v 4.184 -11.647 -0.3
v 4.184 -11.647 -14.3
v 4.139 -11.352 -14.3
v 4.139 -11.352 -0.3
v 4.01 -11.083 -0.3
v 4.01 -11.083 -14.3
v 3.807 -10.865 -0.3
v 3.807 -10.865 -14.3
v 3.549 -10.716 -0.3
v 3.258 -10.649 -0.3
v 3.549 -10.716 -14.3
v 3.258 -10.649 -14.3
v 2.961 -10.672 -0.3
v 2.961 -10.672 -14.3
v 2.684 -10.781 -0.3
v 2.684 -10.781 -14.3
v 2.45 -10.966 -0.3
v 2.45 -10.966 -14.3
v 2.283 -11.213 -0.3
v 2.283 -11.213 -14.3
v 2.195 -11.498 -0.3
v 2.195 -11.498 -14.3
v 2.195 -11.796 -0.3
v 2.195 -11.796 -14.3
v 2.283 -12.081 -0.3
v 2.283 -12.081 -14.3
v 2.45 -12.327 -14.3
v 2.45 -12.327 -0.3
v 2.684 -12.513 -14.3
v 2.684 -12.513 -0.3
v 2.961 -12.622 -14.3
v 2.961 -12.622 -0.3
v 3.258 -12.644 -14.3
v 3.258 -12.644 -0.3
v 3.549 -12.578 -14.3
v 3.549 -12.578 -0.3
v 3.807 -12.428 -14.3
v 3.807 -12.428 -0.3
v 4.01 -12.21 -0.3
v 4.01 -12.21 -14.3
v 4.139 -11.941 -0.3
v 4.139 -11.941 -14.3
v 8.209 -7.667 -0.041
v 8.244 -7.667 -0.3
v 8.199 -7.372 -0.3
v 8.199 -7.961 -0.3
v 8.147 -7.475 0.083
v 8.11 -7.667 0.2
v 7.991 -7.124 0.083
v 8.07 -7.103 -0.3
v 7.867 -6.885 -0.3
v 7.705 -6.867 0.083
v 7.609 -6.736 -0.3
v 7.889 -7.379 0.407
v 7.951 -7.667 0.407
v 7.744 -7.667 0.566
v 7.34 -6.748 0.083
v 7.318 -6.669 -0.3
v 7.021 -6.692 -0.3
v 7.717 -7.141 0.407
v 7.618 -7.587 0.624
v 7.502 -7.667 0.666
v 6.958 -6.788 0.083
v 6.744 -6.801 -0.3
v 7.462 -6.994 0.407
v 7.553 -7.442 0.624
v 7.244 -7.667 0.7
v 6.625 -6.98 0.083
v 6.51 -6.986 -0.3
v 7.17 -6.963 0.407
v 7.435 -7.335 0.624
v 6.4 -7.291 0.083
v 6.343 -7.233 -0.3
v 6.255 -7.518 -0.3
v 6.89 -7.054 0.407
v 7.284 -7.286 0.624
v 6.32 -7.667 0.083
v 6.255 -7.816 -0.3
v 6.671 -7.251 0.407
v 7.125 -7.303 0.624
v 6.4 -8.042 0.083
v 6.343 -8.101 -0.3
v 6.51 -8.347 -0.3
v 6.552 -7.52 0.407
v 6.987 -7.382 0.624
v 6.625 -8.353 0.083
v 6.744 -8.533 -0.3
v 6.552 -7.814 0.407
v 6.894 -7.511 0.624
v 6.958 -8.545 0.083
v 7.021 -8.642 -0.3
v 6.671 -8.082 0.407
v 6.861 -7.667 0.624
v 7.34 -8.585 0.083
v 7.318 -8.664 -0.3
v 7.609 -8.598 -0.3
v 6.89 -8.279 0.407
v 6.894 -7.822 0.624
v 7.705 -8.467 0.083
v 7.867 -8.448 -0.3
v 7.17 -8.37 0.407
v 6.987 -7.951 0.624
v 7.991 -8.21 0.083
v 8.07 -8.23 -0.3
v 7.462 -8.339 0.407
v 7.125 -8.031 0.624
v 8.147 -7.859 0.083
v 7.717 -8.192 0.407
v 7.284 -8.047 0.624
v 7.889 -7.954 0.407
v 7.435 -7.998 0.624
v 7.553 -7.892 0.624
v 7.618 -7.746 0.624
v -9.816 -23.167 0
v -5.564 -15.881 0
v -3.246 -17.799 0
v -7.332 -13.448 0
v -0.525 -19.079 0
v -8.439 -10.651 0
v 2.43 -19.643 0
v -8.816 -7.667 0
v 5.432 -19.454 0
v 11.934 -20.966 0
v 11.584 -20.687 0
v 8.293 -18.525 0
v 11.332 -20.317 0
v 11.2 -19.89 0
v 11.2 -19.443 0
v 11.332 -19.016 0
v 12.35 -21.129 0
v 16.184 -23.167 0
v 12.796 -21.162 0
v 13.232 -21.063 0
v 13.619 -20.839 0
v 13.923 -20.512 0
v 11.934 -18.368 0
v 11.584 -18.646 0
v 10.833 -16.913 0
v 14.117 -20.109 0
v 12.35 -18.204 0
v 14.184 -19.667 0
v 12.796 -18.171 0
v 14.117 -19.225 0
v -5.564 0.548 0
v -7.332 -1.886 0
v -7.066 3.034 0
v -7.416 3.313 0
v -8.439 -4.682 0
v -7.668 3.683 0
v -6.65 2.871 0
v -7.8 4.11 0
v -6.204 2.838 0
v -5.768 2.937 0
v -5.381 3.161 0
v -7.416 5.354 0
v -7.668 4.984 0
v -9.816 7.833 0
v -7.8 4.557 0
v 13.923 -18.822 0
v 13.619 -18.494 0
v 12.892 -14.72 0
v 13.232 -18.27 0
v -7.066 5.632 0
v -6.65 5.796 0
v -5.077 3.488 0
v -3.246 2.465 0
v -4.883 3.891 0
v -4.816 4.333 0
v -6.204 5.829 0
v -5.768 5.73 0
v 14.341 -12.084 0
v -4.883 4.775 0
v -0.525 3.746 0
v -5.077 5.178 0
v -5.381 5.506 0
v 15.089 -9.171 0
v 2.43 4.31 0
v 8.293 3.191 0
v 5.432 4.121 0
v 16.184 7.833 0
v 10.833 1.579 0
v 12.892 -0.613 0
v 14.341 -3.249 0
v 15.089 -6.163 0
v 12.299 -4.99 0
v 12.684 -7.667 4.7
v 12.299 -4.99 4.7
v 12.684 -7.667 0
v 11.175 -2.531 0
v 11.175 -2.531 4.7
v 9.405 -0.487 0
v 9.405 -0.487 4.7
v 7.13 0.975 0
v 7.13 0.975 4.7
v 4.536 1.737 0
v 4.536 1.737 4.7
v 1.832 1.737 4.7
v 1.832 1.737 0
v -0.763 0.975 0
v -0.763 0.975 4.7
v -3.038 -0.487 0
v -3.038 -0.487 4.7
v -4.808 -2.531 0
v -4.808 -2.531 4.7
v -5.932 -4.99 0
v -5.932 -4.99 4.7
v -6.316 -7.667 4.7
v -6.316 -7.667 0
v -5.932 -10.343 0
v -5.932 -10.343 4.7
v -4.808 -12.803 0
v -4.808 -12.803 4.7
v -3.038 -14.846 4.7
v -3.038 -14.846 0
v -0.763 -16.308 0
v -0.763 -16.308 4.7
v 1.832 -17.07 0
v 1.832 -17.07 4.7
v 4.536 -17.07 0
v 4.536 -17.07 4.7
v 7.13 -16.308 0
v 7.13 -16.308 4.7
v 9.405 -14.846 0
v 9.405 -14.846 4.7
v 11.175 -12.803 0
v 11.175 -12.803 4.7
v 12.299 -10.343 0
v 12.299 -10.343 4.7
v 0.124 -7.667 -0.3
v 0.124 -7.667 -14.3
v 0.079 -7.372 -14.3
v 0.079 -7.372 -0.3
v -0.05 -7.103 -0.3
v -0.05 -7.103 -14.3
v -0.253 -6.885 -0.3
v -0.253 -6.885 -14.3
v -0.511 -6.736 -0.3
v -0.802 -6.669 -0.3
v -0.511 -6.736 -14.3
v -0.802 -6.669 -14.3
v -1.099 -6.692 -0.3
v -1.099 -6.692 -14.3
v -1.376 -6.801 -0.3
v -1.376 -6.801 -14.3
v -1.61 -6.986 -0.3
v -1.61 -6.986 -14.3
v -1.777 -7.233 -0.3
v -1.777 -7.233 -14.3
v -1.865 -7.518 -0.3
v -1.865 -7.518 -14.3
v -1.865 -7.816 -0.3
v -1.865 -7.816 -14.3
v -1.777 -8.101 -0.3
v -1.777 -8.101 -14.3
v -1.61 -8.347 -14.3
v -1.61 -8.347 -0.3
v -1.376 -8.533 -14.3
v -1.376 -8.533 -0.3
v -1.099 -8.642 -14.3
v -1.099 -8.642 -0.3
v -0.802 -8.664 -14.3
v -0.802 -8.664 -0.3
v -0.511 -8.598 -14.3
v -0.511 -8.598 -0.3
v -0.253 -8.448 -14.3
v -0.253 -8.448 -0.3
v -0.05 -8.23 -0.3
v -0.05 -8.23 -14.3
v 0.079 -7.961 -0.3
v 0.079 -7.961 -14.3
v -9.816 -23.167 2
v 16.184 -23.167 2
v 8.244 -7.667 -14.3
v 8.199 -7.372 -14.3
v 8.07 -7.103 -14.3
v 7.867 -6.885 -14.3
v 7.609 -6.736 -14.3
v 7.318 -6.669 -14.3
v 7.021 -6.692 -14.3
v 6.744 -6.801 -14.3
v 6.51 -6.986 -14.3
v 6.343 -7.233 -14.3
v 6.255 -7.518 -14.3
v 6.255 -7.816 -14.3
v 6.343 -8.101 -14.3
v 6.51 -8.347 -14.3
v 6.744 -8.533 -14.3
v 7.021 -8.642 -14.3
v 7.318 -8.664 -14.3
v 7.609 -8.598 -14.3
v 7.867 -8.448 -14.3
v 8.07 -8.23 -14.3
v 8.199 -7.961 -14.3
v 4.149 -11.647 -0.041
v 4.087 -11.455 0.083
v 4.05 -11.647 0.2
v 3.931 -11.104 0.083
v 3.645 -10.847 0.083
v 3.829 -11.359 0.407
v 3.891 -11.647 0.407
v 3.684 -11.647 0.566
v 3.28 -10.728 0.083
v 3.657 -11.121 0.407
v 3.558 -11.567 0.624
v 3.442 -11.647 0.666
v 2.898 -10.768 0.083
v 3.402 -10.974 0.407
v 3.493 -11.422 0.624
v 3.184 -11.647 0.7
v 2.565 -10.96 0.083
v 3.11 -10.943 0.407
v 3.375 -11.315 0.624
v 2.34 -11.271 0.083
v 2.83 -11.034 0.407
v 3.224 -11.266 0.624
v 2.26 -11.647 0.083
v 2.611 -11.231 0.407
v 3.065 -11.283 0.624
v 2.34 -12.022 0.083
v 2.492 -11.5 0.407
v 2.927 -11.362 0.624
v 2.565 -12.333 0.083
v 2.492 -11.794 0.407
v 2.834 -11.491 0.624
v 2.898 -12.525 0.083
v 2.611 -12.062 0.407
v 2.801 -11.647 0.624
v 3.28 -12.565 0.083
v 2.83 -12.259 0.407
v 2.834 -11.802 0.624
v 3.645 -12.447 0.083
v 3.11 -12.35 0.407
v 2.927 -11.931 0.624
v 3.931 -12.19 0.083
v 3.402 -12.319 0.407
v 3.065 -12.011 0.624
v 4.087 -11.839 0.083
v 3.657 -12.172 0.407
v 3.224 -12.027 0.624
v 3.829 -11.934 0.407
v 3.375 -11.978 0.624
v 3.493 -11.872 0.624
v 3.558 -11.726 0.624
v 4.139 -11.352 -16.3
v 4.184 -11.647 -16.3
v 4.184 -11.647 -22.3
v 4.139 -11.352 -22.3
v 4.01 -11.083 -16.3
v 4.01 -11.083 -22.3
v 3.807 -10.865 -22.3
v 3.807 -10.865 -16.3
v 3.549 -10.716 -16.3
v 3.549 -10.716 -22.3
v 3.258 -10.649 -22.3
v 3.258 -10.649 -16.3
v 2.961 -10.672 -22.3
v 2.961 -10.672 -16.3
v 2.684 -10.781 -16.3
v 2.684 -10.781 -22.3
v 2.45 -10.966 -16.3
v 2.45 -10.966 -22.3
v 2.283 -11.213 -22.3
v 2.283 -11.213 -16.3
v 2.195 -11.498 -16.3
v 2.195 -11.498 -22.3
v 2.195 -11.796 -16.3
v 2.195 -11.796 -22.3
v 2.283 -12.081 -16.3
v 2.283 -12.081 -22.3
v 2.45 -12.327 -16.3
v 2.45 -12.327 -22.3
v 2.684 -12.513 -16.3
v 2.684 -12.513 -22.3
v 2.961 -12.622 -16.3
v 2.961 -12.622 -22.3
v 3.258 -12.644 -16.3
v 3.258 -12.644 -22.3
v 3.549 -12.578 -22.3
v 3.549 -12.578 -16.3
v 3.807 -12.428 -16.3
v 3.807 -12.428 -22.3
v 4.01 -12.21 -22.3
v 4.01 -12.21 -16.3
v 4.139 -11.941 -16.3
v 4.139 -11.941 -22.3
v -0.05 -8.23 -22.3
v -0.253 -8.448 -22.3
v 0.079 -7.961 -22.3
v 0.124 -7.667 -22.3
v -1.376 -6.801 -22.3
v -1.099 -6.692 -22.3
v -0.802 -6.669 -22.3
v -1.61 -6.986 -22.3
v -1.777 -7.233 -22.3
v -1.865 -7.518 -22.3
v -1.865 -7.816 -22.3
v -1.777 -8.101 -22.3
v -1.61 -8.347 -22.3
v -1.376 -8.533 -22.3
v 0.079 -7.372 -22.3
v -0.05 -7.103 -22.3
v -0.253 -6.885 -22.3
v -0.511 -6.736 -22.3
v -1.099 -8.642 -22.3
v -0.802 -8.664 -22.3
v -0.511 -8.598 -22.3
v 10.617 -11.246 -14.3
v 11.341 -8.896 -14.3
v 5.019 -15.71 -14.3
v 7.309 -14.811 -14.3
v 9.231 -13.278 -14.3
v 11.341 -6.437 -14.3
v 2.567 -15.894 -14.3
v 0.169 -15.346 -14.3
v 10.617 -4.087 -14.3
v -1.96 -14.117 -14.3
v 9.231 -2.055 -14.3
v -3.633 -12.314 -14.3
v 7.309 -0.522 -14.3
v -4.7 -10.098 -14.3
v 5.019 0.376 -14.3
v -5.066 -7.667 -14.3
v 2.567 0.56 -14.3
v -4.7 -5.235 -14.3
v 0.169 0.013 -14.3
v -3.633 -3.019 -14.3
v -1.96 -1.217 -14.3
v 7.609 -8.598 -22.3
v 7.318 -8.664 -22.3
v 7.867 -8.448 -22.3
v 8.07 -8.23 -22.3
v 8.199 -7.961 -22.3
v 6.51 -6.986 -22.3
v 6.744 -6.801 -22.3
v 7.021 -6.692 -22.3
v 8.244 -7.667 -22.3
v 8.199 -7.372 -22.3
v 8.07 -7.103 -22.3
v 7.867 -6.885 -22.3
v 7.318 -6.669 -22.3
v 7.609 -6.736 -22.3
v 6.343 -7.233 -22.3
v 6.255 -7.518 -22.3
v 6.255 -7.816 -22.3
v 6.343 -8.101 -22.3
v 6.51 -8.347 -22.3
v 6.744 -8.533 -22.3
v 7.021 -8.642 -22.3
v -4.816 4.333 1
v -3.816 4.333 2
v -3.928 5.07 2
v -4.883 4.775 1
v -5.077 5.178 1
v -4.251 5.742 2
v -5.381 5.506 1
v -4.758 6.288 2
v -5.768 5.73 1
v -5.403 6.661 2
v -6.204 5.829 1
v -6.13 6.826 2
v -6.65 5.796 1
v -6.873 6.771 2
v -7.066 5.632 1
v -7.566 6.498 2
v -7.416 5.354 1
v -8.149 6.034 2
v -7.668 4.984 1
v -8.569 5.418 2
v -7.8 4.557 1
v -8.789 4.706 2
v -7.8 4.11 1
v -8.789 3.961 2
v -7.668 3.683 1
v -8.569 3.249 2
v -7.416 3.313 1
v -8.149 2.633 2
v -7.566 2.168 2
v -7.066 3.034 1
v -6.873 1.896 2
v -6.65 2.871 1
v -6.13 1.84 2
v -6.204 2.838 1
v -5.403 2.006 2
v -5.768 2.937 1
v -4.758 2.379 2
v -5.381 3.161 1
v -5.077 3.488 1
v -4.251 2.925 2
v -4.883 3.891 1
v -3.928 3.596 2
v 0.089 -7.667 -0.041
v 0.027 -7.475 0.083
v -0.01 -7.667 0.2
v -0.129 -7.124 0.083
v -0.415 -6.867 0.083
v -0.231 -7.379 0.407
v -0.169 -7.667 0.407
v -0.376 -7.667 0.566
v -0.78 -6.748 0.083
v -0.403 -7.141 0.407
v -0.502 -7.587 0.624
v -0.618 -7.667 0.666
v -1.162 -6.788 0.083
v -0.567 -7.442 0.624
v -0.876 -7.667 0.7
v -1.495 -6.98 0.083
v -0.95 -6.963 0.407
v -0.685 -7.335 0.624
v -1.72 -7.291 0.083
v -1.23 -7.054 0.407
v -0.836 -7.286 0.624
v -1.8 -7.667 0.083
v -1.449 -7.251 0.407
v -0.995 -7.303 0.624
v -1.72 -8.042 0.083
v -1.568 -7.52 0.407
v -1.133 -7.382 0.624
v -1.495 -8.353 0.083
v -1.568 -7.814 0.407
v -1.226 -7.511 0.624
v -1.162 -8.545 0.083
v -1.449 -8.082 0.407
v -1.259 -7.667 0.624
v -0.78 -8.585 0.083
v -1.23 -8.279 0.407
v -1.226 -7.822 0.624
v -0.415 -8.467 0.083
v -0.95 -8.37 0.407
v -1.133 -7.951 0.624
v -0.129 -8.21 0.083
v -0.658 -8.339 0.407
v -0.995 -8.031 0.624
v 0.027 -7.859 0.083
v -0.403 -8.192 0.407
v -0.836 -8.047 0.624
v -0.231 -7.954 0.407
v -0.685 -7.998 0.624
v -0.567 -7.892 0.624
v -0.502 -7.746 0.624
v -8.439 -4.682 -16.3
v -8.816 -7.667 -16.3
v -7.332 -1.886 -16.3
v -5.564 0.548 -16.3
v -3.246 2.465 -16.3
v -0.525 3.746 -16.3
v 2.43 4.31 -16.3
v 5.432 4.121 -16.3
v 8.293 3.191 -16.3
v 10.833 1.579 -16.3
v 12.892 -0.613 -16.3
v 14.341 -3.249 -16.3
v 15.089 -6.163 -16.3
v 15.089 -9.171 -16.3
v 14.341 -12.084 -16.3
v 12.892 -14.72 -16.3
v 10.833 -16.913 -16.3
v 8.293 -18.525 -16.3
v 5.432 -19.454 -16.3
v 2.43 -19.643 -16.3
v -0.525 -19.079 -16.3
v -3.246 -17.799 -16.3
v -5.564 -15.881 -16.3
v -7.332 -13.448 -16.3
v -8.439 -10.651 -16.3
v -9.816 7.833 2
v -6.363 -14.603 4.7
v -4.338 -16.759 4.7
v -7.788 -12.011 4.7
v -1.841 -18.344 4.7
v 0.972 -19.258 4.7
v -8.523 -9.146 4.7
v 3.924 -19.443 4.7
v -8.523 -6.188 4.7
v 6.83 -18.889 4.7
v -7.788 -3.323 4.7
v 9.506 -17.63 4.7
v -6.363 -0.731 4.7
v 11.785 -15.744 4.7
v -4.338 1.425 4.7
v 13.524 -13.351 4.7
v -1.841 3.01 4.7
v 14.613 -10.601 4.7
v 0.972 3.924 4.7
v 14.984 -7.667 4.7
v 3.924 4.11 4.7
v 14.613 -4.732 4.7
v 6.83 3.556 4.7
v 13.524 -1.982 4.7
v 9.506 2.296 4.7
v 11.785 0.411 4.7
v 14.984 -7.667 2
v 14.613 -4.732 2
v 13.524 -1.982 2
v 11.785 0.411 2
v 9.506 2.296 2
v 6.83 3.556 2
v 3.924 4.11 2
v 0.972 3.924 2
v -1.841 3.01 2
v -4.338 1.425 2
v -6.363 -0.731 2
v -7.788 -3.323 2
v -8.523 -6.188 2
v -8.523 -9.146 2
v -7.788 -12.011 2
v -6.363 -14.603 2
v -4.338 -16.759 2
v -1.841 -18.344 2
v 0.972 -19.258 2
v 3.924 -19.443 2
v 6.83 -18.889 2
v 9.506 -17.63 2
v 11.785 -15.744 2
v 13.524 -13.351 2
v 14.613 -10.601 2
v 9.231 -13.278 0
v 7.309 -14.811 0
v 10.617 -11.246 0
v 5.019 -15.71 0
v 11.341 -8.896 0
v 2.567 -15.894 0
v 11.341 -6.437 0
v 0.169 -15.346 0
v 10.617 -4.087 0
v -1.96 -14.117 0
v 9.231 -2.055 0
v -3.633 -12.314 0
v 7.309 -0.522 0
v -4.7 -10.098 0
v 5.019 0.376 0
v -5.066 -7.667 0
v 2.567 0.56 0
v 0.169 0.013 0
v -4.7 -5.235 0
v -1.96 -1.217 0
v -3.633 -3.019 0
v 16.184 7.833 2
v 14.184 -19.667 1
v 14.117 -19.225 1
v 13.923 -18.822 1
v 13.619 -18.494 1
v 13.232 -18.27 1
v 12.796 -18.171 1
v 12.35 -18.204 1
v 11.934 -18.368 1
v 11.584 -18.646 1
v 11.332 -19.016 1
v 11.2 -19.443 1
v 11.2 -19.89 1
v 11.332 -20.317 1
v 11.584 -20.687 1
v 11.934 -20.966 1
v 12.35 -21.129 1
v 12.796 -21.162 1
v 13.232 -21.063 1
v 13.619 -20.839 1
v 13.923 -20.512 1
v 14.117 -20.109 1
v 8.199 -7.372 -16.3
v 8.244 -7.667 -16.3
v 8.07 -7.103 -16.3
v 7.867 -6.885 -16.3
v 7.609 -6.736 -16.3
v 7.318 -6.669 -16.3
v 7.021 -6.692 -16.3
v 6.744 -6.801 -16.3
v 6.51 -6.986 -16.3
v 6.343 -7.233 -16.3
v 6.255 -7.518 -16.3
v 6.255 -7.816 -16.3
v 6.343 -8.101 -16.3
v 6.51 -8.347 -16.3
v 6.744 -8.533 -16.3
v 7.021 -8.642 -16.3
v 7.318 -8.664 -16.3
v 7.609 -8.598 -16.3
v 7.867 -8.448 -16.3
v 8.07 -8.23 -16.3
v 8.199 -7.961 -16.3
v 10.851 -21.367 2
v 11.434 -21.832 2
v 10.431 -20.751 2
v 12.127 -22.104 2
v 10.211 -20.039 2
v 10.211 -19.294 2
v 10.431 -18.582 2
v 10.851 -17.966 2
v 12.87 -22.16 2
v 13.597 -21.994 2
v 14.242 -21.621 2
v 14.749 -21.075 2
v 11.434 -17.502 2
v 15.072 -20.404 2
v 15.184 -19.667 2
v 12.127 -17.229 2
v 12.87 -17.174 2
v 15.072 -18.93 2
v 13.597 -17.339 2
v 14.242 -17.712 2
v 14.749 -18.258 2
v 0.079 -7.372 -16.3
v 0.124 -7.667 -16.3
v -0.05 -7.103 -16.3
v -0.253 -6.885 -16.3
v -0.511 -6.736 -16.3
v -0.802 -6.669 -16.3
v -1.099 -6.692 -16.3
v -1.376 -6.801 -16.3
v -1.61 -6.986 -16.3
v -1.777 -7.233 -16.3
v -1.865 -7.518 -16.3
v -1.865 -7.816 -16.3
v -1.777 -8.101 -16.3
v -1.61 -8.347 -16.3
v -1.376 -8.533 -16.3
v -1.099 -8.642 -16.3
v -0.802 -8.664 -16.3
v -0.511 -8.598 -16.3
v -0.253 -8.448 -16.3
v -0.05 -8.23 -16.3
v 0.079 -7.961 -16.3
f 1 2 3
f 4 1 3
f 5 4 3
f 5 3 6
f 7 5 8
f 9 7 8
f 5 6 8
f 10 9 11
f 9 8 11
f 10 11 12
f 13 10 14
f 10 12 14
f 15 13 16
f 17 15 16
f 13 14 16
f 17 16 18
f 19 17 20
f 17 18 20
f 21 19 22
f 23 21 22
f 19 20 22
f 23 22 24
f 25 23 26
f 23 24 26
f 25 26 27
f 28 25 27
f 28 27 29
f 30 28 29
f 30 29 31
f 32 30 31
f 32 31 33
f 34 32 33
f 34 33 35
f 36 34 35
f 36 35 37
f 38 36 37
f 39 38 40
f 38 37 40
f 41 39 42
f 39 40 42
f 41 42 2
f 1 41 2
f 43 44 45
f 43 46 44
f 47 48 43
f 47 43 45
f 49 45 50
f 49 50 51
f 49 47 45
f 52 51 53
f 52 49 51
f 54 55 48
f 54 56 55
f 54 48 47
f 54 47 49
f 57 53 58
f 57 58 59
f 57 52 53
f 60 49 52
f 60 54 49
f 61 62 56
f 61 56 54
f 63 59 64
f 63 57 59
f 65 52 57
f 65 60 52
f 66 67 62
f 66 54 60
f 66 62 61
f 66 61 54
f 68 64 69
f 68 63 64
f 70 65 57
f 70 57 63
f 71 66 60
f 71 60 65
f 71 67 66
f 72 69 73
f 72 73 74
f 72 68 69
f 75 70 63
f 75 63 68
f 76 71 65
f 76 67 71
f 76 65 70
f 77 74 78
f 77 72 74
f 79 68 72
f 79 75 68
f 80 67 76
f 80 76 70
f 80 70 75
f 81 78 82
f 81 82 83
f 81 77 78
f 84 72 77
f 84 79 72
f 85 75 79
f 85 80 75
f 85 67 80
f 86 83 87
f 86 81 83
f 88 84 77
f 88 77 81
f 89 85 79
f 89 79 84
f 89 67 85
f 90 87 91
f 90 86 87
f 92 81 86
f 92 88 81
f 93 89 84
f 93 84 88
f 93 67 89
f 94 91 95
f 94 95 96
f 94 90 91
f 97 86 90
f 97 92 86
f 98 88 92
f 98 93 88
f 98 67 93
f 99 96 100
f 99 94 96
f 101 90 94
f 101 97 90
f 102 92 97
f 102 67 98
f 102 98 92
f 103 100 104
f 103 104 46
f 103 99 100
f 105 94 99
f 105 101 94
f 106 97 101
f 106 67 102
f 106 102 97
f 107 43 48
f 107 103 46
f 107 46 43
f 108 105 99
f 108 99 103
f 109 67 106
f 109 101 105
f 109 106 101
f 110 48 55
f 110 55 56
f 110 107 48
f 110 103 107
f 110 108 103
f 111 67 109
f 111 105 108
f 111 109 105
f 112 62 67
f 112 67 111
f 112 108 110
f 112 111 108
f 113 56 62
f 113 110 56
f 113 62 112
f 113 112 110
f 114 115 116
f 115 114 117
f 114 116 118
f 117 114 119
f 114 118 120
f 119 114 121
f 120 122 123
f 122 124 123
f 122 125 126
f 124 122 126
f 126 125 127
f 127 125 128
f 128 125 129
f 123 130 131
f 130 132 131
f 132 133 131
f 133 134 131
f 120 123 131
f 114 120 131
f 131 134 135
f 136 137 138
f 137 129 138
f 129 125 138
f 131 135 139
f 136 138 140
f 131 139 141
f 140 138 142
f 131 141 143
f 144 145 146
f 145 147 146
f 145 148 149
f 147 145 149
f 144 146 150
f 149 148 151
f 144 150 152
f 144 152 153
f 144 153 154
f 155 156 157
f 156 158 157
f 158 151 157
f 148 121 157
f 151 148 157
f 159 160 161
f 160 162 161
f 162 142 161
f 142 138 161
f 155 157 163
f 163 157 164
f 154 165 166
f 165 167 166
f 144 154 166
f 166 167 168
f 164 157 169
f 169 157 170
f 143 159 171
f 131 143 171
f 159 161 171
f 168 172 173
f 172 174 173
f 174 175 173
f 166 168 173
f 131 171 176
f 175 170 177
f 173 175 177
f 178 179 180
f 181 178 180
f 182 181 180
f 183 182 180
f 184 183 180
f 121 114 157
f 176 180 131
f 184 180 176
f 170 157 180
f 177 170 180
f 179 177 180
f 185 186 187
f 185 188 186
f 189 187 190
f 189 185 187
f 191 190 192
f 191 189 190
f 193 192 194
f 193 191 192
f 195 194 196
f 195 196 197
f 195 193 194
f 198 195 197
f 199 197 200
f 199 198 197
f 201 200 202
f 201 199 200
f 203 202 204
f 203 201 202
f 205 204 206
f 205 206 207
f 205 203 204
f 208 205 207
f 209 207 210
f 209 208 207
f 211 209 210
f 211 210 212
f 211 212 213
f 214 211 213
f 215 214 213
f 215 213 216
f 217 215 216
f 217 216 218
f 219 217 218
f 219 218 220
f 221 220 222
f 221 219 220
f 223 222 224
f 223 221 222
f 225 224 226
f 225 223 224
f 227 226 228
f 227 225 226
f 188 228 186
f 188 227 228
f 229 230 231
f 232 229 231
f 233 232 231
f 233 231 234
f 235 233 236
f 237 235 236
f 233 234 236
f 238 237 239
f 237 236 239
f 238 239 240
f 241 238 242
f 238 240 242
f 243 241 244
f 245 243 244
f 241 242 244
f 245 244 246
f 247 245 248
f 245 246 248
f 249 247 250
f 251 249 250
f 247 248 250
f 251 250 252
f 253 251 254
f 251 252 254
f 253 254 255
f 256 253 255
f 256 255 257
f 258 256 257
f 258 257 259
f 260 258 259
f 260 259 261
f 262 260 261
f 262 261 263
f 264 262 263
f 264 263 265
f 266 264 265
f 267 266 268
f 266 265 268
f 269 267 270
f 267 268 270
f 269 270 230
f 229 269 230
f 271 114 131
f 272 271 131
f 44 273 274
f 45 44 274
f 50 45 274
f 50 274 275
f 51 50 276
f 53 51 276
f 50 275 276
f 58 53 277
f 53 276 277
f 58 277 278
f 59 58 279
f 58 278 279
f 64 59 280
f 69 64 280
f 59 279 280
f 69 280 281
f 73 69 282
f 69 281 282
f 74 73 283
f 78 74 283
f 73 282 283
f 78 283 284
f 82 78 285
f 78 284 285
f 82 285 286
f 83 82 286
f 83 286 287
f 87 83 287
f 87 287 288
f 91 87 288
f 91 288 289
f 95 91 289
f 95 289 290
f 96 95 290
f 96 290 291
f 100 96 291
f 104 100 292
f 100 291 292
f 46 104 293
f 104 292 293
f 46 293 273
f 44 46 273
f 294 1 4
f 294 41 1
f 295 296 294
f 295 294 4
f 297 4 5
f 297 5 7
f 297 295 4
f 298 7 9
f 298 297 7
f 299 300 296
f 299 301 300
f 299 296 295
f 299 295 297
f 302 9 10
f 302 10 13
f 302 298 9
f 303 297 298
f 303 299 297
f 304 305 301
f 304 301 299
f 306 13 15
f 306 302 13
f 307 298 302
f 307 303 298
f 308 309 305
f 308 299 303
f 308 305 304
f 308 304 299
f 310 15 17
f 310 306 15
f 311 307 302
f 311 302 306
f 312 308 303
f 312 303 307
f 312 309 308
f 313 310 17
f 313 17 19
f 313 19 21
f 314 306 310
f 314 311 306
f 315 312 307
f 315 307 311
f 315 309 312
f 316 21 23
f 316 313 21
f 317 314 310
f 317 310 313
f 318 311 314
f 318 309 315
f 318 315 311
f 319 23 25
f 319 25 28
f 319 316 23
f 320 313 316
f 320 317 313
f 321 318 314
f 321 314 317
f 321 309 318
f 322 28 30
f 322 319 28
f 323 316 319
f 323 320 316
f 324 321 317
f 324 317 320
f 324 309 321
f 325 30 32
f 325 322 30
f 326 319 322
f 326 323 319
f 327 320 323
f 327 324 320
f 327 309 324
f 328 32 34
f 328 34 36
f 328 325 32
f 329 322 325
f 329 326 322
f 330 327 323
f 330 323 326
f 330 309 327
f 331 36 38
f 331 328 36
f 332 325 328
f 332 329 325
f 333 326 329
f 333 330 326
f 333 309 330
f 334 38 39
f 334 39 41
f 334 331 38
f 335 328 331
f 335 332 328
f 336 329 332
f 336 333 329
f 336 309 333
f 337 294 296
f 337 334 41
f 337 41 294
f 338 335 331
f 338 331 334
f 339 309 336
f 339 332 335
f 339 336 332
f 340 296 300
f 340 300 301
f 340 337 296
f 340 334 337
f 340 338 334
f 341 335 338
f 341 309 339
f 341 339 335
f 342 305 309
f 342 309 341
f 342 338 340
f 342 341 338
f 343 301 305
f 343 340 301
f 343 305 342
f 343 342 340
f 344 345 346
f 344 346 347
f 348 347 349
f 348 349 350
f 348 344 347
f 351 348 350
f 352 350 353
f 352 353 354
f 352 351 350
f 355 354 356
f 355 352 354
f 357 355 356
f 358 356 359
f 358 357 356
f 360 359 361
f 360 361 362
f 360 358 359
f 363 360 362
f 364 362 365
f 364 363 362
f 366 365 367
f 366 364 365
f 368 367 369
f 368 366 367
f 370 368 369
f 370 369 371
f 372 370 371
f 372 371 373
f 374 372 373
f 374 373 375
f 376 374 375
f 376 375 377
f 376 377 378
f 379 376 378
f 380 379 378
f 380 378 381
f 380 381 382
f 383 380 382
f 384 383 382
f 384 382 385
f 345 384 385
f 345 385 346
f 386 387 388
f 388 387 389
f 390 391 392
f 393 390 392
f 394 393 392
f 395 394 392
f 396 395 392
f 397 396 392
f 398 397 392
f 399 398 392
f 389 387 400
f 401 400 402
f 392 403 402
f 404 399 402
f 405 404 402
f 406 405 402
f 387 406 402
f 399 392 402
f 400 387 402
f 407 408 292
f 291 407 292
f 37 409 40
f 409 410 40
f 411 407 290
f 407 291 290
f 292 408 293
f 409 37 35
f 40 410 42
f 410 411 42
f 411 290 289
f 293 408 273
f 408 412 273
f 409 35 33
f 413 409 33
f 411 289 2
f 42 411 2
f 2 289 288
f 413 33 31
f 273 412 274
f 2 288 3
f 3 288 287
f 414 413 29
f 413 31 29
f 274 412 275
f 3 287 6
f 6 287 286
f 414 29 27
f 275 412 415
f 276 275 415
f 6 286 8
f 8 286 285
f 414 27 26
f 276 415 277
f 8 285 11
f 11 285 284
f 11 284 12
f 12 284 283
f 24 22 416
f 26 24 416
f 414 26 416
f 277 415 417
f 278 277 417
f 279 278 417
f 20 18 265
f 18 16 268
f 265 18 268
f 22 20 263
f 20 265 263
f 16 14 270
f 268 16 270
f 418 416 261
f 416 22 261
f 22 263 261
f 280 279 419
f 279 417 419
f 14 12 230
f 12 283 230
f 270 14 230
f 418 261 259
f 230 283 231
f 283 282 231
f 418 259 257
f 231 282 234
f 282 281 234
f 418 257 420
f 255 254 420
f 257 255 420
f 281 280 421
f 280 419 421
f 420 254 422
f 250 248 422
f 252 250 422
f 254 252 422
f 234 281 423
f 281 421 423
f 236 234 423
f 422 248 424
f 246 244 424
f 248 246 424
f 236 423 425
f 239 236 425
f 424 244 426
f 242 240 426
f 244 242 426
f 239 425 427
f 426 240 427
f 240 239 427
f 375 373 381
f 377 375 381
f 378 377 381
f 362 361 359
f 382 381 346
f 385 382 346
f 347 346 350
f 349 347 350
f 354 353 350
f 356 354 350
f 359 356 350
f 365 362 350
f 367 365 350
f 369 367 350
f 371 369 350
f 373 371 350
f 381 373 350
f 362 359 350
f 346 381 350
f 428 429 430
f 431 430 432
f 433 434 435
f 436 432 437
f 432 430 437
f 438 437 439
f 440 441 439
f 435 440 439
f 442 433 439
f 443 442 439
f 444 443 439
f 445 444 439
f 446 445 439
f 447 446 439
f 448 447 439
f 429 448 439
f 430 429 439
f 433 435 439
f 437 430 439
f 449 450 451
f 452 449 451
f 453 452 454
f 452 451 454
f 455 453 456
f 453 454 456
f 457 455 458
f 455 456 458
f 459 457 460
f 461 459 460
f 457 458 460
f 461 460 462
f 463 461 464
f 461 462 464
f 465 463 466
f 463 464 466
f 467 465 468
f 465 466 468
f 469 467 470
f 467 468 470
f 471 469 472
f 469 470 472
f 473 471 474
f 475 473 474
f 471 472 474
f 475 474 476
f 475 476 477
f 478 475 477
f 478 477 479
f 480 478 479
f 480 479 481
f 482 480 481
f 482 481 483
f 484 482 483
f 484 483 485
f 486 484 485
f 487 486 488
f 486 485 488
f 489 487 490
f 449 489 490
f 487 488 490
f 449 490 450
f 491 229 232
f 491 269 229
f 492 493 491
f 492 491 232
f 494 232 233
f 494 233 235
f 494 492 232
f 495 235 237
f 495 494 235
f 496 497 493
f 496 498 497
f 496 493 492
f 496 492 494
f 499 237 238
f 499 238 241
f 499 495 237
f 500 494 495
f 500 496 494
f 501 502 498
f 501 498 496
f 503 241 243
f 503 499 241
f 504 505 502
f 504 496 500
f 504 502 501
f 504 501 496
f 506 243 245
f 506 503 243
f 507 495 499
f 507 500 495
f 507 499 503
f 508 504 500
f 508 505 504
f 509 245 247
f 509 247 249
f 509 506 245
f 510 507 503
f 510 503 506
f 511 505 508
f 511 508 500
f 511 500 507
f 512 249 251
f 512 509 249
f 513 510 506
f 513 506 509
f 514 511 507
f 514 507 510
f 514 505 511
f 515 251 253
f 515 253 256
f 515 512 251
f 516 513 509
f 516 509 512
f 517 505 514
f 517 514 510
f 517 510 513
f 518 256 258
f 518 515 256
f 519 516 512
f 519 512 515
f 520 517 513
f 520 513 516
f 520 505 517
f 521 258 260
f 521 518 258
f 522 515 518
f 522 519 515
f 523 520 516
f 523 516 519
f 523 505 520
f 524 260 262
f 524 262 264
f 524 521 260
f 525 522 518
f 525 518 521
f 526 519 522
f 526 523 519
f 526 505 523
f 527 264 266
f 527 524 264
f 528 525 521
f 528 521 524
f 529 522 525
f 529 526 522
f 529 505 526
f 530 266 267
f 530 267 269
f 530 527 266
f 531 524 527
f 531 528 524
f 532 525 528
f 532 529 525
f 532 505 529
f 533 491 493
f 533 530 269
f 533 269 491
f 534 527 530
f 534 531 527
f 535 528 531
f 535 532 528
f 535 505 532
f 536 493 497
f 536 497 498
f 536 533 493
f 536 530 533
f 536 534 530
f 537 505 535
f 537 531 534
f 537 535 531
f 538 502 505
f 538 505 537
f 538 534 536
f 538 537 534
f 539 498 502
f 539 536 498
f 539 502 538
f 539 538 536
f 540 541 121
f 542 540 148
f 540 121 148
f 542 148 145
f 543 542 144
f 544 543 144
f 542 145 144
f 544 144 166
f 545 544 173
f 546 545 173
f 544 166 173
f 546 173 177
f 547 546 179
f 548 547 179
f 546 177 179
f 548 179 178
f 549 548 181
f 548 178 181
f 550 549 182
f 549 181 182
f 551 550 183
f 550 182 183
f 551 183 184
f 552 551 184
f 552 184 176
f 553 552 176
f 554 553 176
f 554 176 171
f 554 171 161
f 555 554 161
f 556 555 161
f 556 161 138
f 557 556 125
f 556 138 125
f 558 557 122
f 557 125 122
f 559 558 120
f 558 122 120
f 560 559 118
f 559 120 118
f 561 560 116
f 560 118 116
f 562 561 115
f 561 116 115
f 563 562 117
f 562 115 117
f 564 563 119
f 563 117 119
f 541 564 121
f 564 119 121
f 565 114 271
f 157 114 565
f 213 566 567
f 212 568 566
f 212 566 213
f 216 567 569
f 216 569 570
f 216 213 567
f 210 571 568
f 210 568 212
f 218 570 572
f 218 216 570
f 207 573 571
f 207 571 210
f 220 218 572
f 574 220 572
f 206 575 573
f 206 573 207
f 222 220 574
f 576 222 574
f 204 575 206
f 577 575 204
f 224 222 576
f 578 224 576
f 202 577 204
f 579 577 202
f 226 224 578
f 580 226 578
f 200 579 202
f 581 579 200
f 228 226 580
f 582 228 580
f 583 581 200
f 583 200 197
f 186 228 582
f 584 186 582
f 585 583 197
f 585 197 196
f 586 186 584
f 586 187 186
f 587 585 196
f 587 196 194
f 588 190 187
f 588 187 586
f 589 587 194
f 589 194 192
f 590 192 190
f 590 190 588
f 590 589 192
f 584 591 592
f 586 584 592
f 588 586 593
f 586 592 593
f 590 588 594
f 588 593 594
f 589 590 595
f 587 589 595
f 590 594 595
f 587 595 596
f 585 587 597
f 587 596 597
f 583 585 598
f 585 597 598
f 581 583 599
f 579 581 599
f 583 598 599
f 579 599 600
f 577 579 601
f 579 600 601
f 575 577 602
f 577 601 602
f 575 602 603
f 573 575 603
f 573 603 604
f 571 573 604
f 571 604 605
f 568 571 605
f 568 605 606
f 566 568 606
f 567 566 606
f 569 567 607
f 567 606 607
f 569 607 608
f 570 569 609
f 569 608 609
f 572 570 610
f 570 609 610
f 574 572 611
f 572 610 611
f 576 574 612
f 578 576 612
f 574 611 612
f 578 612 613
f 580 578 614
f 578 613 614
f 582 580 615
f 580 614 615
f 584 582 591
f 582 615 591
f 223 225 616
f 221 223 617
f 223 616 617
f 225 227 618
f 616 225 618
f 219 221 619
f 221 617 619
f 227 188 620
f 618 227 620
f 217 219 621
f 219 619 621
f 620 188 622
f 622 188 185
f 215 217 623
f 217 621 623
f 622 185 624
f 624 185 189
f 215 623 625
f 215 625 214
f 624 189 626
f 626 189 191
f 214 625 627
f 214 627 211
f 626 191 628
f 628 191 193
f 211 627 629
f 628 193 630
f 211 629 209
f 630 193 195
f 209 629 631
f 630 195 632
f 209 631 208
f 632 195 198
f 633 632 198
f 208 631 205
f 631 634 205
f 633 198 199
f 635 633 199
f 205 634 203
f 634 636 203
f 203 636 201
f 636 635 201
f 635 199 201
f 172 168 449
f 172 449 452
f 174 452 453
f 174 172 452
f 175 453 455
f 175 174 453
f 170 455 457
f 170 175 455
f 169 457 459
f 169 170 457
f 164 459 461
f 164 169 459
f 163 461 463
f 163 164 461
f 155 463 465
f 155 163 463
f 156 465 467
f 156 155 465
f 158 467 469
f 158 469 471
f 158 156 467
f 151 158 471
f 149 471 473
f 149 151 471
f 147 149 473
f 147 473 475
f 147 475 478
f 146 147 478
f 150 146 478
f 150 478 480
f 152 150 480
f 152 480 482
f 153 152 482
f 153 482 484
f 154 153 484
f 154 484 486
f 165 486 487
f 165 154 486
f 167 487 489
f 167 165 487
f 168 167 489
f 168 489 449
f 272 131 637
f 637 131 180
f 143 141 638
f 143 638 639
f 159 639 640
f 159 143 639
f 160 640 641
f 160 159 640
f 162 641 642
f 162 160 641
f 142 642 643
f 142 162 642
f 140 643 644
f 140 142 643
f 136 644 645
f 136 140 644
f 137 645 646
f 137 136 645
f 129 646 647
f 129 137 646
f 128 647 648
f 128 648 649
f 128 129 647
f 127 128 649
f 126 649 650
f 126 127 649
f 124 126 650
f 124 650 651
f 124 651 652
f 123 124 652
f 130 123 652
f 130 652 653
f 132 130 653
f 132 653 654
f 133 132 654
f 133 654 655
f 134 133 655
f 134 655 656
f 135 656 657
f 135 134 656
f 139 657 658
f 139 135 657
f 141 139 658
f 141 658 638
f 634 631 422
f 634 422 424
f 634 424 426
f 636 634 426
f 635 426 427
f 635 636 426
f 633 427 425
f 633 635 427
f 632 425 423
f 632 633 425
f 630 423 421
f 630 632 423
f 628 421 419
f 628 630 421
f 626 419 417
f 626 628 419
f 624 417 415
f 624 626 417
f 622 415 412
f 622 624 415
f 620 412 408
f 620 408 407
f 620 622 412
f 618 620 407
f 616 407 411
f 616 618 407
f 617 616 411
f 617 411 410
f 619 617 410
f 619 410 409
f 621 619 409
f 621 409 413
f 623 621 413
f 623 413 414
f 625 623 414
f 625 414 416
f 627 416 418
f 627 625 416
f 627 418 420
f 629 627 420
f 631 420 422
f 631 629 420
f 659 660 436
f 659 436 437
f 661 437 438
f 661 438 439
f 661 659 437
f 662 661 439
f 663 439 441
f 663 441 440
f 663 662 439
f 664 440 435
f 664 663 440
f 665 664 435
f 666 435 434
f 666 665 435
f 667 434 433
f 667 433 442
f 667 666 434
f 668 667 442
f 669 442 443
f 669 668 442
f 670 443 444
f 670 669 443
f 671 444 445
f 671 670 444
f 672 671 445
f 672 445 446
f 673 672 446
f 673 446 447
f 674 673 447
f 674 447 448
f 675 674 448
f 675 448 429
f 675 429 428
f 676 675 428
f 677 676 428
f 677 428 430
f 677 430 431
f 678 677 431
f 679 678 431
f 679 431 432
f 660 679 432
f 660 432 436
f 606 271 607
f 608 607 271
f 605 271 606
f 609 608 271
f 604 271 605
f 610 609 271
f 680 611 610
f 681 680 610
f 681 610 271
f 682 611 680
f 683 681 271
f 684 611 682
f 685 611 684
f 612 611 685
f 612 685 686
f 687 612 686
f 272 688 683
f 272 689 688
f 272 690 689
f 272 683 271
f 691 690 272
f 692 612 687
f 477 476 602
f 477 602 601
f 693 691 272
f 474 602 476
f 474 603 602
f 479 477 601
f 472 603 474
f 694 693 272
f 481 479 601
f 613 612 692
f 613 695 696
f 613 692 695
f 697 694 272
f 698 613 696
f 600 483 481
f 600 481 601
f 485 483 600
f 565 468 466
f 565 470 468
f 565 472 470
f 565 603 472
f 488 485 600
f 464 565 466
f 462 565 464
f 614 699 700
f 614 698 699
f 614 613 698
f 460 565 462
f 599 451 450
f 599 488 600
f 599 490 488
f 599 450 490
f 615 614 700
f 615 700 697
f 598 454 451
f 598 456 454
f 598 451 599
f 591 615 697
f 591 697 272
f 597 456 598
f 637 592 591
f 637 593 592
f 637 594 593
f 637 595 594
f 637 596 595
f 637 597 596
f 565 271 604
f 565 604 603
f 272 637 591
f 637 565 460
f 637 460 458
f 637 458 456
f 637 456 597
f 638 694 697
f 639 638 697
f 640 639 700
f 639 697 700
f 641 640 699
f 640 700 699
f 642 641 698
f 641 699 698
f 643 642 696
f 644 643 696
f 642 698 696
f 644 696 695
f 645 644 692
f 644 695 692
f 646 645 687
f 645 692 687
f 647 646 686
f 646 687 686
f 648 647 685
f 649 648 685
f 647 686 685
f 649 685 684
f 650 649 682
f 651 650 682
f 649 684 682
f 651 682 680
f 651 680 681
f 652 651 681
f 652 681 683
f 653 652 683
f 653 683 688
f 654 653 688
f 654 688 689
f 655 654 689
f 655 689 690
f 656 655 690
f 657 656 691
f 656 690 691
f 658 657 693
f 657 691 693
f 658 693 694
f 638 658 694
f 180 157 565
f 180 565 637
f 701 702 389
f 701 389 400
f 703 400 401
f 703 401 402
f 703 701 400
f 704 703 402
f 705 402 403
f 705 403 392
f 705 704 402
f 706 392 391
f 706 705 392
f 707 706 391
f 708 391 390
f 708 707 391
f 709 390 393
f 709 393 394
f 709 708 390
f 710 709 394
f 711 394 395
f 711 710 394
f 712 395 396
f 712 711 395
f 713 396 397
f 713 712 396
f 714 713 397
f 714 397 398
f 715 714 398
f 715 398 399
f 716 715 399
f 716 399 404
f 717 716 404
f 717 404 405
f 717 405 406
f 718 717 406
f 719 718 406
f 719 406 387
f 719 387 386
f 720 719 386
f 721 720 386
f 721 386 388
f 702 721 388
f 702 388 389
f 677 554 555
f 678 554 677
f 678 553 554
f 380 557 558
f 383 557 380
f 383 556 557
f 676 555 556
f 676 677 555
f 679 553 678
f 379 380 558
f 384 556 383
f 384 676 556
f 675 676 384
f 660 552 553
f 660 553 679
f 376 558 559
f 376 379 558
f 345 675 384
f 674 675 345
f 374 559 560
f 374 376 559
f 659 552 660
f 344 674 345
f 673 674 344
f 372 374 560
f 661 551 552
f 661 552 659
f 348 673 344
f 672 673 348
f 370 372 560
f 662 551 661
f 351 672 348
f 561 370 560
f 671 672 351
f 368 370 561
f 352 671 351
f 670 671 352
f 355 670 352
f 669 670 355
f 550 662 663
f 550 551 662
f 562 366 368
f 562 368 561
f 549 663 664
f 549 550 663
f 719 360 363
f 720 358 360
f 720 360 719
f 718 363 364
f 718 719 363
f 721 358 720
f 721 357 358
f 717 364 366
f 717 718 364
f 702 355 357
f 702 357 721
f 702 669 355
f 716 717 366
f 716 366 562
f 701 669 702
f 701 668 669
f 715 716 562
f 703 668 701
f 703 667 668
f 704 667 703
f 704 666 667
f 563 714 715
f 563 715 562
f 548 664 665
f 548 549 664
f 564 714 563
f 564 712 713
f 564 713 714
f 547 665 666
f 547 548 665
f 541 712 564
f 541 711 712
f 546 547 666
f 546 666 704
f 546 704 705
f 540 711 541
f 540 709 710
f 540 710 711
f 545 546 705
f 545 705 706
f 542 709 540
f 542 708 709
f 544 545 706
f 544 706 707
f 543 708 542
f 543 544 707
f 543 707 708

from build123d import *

# Parameters (mm, degrees)
ESQUISSE1_W             = 26
ESQUISSE1_H             = 31
ESQUISSE1_R             = 9.5
ESQUISSE1_R_2           = 1.5
BOSS_EXTRU_1_DEPTH      = 2
ESQUISSE2_R             = 11.8
ESQUISSE2_R_2           = 9.5
BOSS_EXTRU_2_DEPTH      = 2.7
CHANFREIN1_SIZE         = 1
ESQUISSE3_R             = 12
ESQUISSE3_R_2           = 8.25
BOSS_EXTRU_3_DEPTH      = 14.3
ESQUISSE4_R             = 12
BOSS_EXTRU_4_DEPTH      = 2
ESQUISSE5_R             = 1
BOSS_EXTRU_5_DEPTH      = 15
BOSS_EXTRU_5_DEPTH_BACK = 8
CONG_1_R                = 1


with BuildPart() as part:
    # Esquisse1 → Boss.-Extru.1 (new body)
    with BuildSketch(Plane.XY):
        with Locations((3.183515483, -7.666666667)):
            Rectangle(ESQUISSE1_W, ESQUISSE1_H)
        with Locations((3.183515483, -7.666666667)):
            Circle(ESQUISSE1_R, mode=Mode.SUBTRACT)
        with Locations((-6.316484517, 4.333333333)):
            Circle(ESQUISSE1_R_2, mode=Mode.SUBTRACT)
        with Locations((12.683515483, -19.666666667)):
            Circle(ESQUISSE1_R_2, mode=Mode.SUBTRACT)
    extrude(amount=BOSS_EXTRU_1_DEPTH)

    # Esquisse2 → Boss.-Extru.2 (add)
    with BuildSketch(Plane.XY.offset(2)):
        with Locations((3.183515483, -7.666666667)):
            Circle(ESQUISSE2_R)
        with Locations((3.183515483, -7.666666667)):
            Circle(ESQUISSE2_R_2, mode=Mode.SUBTRACT)
    extrude(amount=BOSS_EXTRU_2_DEPTH)

    # Chanfrein1
    chanfrein1_edges = [part.edges().sort_by_distance(p)[0] for p in [
        (-7.816484517, 4.333333333, 2),
        (11.183515483, -19.666666667, 2),
    ]]
    chamfer(chanfrein1_edges, length=CHANFREIN1_SIZE)

    # Esquisse3 → Boss.-Extru.3 (add)
    with BuildSketch(Plane(origin=(0, 0, 0), x_dir=(-1, 0, 0), z_dir=(0, 0, -1))):
        with Locations((-3.183515483, -7.666666667)):
            Circle(ESQUISSE3_R)
        with Locations((-3.183515483, -7.666666667)):
            Circle(ESQUISSE3_R_2, mode=Mode.SUBTRACT)
    extrude(amount=BOSS_EXTRU_3_DEPTH)

    # Esquisse4 → Boss.-Extru.4 (add)
    with BuildSketch(Plane(origin=(0, 0, -14.3), x_dir=(-1, 0, 0), z_dir=(0, 0, -1))):
        with Locations((-3.183515483, -7.666666667)):
            Circle(ESQUISSE4_R)
    extrude(amount=BOSS_EXTRU_4_DEPTH)

    # Esquisse5 → Boss.-Extru.5 (add, two sides)
    with BuildSketch(Plane.XY.offset(-14.3)) as boss_extru_5_sk:
        with Locations((7.243515483, -7.666666667)):
            Circle(ESQUISSE5_R)
        with Locations((-0.876484517, -7.666666667)):
            Circle(ESQUISSE5_R)
        with Locations((3.183515483, -11.646666667)):
            Circle(ESQUISSE5_R)
    extrude(amount=BOSS_EXTRU_5_DEPTH)
    extrude(boss_extru_5_sk.sketch, amount=-BOSS_EXTRU_5_DEPTH_BACK)

    # Congé1
    cong_1_edges = [part.edges().sort_by_distance(p)[0] for p in [
        (6.243515483, -7.666666667, 0.7),
        (-1.876484517, -7.666666667, 0.7),
        (2.183515483, -11.646666667, 0.7),
    ]]
    fillet(cong_1_edges, radius=CONG_1_R)


solid = part.part
